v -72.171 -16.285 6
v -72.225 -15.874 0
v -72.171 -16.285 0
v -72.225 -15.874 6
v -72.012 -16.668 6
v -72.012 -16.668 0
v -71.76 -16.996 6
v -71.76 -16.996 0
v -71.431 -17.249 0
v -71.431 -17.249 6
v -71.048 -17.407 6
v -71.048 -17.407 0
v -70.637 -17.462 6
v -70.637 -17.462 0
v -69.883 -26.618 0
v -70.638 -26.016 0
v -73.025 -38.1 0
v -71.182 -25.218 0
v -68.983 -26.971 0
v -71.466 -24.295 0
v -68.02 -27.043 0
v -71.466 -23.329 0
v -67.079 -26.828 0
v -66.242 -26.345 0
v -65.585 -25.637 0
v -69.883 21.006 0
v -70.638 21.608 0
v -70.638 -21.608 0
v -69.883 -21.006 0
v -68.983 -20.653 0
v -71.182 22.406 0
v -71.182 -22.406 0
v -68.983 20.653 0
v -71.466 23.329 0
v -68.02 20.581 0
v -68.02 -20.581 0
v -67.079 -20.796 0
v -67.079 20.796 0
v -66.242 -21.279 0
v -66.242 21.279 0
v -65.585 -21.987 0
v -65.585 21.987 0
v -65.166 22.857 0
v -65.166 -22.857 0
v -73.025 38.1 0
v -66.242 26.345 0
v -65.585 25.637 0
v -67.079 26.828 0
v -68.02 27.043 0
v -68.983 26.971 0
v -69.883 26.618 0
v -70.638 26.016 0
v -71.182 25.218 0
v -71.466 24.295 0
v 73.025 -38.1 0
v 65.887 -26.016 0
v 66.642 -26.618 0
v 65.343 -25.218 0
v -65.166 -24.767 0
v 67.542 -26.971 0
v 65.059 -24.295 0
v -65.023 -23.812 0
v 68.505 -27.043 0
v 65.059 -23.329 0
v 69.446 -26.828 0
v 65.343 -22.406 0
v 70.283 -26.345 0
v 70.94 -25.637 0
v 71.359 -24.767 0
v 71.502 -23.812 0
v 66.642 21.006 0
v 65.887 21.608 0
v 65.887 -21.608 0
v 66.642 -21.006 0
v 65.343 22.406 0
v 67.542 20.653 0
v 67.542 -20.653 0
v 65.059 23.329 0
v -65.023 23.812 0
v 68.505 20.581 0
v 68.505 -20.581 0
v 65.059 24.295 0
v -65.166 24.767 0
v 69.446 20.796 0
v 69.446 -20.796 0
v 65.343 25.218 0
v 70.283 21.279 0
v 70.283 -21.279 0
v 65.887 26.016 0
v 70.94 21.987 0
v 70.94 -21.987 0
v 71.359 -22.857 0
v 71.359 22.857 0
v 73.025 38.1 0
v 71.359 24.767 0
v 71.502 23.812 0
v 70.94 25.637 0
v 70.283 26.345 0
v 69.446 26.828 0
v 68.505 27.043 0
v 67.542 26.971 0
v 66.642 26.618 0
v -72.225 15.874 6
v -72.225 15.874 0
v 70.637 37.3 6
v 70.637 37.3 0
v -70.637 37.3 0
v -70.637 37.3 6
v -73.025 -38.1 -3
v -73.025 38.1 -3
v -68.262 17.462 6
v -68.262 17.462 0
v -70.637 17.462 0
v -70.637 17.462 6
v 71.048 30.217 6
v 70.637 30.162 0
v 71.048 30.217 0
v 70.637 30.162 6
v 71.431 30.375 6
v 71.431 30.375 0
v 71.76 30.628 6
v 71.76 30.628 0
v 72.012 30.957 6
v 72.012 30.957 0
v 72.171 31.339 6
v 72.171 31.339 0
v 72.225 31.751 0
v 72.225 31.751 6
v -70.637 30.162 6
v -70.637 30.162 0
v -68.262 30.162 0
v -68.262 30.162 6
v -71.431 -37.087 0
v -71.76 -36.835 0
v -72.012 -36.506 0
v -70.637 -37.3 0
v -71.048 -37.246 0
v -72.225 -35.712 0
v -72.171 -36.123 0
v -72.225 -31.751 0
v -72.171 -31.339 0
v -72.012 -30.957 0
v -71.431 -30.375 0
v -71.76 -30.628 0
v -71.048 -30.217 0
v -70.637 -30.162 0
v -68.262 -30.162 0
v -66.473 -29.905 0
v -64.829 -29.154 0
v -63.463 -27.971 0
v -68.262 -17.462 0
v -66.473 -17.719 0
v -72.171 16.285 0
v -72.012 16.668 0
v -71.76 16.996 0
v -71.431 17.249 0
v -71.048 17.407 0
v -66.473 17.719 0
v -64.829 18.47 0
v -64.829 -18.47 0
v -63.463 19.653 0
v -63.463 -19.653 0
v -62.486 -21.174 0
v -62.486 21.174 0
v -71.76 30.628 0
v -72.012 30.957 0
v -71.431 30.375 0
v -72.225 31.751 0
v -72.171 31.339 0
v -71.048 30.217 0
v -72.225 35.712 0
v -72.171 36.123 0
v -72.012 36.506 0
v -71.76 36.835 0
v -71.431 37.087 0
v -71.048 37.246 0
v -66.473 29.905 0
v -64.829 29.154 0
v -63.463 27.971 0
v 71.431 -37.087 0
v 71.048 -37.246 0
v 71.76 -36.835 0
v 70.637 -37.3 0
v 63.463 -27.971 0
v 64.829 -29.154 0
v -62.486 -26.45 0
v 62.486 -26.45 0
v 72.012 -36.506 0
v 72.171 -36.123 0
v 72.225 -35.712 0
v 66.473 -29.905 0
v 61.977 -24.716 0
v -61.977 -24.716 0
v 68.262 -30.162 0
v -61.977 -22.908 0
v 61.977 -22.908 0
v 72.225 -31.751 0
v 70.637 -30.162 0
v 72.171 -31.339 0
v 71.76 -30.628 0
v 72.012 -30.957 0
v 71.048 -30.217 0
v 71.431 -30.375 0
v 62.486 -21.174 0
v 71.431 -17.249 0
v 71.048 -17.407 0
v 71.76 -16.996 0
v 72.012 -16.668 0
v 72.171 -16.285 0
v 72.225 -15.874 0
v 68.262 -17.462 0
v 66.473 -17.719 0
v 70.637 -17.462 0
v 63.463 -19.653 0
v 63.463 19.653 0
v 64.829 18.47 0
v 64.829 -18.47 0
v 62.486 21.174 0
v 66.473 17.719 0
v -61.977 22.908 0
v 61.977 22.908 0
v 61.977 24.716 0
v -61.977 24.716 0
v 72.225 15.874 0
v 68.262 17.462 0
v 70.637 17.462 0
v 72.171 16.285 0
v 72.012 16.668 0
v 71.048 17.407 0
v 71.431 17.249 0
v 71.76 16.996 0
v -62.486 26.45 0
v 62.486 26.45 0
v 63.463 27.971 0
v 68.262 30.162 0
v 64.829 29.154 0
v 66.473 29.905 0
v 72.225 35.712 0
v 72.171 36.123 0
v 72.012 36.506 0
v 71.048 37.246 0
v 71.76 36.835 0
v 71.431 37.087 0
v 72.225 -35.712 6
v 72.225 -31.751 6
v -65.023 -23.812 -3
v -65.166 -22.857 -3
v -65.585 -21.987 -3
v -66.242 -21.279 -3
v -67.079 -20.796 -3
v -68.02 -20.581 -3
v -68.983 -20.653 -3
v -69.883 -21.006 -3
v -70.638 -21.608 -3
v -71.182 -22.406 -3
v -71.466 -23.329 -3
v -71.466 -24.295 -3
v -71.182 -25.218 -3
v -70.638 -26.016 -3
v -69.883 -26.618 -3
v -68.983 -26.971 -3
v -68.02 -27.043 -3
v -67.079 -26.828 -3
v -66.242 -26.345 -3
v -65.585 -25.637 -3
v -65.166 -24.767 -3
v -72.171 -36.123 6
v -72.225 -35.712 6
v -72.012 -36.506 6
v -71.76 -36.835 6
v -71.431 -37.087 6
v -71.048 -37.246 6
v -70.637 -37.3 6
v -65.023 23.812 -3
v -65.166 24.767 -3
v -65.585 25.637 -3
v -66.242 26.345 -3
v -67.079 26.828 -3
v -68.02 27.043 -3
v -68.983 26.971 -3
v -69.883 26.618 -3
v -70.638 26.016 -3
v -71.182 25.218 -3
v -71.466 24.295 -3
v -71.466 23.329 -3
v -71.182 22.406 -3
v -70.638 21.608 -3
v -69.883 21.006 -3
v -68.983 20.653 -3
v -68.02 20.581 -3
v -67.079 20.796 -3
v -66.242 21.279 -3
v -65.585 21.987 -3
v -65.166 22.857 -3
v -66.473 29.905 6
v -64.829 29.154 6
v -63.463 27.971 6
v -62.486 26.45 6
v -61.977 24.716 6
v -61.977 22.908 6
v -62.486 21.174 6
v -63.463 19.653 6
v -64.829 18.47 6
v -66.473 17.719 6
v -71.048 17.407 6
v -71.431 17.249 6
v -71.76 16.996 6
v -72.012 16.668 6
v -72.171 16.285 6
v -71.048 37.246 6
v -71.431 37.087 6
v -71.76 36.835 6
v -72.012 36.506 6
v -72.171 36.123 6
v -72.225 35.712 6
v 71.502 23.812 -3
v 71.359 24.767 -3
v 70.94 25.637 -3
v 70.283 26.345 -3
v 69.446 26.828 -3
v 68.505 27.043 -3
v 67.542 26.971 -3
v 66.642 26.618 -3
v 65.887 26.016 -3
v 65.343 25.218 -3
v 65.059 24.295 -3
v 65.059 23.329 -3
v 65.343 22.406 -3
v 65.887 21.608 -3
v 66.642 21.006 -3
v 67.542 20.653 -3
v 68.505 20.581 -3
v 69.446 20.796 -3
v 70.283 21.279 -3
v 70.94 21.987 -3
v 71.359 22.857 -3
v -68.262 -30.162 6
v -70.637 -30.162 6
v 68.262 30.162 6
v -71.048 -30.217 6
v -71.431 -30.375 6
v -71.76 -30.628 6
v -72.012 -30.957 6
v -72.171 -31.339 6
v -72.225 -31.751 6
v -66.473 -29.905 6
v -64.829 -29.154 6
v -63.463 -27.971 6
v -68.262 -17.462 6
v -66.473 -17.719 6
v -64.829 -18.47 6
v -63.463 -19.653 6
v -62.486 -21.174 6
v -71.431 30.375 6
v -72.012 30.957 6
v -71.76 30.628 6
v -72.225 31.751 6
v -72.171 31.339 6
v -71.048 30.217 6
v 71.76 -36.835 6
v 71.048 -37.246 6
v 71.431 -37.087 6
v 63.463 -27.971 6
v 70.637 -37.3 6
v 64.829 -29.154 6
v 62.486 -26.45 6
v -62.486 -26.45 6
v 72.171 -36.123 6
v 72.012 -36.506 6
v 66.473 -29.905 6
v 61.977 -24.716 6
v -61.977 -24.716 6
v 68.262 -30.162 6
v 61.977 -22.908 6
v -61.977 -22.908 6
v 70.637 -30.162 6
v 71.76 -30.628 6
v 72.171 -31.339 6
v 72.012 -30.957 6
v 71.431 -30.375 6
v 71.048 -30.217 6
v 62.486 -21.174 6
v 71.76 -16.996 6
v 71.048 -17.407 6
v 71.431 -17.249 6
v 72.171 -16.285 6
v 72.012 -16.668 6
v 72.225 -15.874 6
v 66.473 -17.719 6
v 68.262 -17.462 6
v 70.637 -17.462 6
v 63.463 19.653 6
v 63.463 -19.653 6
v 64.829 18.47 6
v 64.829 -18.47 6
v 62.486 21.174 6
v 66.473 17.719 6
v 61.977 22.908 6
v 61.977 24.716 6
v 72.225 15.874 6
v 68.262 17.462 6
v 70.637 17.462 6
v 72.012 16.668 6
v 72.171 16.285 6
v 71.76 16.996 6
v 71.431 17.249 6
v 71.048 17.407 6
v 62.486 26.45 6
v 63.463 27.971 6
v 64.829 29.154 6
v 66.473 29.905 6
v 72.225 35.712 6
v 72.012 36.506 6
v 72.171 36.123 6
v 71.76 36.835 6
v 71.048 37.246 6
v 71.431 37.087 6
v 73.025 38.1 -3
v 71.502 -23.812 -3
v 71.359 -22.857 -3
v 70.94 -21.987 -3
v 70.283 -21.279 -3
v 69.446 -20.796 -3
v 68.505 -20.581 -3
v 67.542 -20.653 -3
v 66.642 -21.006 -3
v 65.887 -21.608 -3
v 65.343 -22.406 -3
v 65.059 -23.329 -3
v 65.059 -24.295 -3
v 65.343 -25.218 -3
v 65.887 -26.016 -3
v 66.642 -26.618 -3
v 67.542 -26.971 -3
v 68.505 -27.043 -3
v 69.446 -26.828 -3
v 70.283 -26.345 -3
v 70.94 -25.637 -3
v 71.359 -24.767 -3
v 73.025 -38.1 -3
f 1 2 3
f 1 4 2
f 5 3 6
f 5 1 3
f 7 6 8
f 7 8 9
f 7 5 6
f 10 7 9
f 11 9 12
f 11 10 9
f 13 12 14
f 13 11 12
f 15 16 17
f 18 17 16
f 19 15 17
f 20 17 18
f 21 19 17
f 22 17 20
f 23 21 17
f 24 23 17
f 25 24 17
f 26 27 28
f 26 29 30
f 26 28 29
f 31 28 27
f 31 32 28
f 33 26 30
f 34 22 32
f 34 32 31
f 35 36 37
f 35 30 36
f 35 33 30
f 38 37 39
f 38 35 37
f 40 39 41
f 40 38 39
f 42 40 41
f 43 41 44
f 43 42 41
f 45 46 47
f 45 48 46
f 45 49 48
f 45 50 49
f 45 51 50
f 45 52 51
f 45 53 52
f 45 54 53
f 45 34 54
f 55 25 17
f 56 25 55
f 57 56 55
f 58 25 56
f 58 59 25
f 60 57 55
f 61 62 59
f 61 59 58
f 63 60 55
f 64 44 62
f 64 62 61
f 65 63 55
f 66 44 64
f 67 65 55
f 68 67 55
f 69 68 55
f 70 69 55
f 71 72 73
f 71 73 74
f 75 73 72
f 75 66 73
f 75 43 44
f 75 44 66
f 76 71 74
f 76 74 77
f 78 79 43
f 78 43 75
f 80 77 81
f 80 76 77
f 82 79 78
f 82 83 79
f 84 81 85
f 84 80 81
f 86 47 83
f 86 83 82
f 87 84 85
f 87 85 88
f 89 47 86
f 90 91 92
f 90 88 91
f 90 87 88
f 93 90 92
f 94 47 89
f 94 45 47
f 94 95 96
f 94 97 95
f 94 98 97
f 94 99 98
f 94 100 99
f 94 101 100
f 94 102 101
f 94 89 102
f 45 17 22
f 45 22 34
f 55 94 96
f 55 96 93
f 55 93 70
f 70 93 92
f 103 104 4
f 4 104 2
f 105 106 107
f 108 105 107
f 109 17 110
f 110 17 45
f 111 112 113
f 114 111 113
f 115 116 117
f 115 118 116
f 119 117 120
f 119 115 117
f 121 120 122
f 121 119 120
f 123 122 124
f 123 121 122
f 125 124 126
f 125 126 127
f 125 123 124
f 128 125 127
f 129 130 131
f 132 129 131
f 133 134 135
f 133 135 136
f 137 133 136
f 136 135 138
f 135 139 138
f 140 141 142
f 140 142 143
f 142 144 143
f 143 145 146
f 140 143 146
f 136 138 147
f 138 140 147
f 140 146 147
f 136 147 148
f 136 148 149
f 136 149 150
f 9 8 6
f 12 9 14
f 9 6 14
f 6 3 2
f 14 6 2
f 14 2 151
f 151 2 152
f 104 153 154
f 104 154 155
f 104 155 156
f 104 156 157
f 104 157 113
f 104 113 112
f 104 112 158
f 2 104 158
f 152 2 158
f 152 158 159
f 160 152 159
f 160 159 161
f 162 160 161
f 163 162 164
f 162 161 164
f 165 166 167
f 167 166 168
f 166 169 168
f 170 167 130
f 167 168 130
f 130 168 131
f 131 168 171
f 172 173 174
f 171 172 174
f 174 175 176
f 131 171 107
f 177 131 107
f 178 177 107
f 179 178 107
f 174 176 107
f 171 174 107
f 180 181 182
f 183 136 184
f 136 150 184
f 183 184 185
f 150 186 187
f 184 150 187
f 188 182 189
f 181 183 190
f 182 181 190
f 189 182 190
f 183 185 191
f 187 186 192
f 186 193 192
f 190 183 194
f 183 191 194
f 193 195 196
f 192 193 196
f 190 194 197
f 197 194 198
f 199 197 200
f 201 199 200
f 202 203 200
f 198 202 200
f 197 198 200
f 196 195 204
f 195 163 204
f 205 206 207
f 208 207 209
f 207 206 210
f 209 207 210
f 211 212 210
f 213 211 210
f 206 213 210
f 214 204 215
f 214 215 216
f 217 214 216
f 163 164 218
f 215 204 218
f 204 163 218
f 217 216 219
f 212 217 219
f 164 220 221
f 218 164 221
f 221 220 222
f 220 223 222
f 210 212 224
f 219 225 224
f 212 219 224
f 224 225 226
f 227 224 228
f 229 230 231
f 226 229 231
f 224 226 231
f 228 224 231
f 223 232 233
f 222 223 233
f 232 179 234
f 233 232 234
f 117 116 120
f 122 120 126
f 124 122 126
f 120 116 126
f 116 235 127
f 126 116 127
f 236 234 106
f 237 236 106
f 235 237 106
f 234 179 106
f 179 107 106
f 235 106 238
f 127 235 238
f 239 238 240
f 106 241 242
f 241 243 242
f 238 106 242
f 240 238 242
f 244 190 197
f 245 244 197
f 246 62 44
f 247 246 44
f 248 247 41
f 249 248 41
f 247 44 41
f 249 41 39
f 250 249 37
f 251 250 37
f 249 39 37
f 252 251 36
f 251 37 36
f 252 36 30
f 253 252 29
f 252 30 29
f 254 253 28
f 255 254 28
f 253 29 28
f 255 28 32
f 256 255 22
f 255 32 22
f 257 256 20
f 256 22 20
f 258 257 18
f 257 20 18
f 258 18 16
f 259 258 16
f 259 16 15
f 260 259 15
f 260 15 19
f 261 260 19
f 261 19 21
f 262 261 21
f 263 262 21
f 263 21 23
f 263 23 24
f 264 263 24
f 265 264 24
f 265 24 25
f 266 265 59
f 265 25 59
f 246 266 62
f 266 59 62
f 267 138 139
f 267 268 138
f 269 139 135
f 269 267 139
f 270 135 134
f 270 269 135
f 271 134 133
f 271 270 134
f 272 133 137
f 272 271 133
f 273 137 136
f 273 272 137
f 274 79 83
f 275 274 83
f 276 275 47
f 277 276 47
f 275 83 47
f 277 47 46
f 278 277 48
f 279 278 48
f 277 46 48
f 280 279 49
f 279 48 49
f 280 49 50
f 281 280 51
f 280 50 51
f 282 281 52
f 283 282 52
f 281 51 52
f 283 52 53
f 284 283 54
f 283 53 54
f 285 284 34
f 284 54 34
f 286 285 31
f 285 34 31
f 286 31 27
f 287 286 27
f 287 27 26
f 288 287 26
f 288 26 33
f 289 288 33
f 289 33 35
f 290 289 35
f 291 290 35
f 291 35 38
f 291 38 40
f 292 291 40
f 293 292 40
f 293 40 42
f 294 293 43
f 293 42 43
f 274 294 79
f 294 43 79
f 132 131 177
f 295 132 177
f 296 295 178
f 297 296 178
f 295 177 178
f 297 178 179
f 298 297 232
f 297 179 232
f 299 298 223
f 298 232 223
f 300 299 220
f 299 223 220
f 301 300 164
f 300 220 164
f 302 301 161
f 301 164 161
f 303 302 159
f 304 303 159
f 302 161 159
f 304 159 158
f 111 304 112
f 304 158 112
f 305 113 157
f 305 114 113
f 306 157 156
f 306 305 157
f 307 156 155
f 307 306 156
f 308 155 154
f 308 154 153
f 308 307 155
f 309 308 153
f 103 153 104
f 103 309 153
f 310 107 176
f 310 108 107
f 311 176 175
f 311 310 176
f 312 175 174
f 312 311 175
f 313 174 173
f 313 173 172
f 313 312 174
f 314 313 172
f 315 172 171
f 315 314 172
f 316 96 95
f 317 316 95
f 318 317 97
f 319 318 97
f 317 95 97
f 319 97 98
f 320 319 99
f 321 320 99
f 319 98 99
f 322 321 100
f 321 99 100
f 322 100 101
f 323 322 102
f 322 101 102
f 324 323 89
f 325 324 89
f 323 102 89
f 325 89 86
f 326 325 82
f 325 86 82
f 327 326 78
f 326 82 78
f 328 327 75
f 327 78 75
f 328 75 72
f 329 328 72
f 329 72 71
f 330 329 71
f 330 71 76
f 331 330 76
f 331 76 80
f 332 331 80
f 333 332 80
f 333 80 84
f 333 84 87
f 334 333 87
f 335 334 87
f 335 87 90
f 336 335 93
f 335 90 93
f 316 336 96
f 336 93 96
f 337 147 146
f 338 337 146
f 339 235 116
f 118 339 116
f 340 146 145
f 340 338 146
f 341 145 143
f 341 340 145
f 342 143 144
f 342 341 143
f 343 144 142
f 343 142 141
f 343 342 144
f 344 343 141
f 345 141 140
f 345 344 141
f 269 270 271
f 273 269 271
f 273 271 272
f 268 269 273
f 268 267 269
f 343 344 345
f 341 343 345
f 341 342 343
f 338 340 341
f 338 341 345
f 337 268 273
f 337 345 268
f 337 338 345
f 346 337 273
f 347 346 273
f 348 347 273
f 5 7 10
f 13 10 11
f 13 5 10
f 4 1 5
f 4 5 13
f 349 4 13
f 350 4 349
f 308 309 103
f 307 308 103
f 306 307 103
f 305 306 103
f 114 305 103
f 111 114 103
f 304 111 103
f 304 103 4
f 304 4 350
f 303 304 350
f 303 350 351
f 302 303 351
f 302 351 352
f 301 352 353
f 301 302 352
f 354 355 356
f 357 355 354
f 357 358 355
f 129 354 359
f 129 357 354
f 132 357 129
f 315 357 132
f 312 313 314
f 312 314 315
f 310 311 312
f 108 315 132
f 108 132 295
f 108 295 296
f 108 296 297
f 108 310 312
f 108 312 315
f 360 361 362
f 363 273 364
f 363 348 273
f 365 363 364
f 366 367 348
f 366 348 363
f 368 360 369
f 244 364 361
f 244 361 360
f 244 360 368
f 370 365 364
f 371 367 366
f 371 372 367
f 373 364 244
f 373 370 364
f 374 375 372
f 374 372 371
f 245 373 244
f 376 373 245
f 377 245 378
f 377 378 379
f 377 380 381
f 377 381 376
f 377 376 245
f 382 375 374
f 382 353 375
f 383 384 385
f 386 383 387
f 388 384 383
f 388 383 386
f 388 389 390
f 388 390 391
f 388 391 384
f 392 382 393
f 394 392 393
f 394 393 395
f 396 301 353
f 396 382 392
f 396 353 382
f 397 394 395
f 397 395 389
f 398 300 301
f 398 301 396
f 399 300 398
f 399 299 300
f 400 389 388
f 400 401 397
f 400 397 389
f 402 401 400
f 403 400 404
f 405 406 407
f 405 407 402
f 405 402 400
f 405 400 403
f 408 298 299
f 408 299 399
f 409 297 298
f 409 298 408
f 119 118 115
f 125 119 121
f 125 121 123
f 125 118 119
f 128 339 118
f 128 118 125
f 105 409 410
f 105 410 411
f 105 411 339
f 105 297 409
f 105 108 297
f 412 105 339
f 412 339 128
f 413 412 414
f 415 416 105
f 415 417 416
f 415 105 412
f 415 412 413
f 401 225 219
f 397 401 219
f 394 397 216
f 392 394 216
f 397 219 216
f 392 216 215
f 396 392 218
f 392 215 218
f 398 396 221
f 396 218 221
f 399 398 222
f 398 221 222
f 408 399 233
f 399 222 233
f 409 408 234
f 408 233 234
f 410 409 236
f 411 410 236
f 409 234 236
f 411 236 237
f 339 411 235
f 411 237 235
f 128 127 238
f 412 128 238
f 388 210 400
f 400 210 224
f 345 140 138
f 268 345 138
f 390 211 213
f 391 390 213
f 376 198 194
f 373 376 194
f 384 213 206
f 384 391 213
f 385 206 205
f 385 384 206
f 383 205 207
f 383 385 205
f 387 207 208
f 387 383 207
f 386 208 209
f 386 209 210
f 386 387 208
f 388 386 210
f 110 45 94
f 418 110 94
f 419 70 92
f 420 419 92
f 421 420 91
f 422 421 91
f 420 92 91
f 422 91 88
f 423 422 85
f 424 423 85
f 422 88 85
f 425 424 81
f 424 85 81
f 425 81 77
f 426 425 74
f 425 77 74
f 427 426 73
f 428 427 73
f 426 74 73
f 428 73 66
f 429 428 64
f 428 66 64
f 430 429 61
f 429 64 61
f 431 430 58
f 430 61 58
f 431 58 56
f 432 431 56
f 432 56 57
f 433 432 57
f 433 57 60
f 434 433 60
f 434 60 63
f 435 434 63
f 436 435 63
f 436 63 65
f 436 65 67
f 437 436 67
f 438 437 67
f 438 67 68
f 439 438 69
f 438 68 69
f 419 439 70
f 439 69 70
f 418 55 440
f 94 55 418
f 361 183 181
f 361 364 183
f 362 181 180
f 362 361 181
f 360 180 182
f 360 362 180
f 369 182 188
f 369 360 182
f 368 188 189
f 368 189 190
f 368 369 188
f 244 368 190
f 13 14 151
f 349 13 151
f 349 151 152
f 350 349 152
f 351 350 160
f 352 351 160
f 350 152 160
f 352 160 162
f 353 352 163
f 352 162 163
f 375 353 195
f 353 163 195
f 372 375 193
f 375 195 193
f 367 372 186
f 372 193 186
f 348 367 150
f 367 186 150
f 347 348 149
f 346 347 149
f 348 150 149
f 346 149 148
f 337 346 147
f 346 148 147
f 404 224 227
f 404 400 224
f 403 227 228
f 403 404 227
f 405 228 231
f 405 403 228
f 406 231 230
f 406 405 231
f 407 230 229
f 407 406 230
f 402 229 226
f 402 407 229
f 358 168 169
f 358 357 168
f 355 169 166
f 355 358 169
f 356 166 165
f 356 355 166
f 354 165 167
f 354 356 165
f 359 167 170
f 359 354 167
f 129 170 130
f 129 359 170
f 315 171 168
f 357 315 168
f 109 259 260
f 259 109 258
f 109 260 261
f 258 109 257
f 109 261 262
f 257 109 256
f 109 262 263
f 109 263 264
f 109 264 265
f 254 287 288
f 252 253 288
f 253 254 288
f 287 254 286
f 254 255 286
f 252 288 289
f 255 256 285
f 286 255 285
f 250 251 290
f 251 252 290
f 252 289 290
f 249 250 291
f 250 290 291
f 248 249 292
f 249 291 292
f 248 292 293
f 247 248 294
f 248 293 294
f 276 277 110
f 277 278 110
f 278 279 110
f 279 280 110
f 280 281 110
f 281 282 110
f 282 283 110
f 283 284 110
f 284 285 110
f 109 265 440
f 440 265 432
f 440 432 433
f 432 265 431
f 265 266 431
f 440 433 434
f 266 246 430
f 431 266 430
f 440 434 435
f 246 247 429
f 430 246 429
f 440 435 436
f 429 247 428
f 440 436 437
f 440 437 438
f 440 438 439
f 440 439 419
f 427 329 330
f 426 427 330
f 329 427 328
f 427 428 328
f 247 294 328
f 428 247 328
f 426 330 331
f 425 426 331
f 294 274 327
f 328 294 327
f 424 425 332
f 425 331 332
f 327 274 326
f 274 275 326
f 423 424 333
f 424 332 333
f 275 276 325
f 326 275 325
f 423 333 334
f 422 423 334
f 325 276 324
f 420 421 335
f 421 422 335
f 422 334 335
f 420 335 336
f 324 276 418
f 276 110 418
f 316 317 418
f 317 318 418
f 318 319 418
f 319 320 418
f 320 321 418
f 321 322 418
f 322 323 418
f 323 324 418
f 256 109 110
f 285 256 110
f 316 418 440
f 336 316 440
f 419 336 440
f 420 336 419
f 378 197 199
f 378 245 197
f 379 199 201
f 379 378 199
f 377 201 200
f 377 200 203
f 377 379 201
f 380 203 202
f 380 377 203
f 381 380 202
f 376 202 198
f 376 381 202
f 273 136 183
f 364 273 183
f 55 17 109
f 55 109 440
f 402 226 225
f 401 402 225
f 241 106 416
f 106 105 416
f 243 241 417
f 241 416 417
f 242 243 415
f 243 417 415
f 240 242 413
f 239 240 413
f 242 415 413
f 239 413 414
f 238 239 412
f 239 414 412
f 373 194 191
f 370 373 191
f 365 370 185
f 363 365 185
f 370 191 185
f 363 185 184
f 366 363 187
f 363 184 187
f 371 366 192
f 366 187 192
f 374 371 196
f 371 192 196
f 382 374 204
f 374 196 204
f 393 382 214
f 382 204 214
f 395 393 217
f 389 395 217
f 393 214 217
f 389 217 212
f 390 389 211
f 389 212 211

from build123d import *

# Parameters (mm, degrees)
F0_W     = 146.05
F0_H     = 76.2
F0_R     = 3.24
F1_DEPTH = 3
F2_DEPTH = 6
F3_R     = 1.588


with BuildPart() as f1:
    # F0 (on Top) → F1 (new body)
    with BuildSketch(Plane.XY):
        Rectangle(F0_W, F0_H)
        with Locations((-68.2625, -23.812)):
            Circle(F0_R, mode=Mode.SUBTRACT)
        with Locations((68.2625, -23.812)):
            Circle(F0_R, mode=Mode.SUBTRACT)
        with Locations((-68.2625, 23.812)):
            Circle(F0_R, mode=Mode.SUBTRACT)
        with BuildLine():
            Line((-72.225, 30.1625), (-72.225, 37.3))
            Line((-72.225, 37.3), (72.225, 37.3))
            Line((72.225, 37.3), (72.225, 30.1625))
            Line((72.225, 30.1625), (68.2625, 30.1625))
            ThreePointArc((68.2625, 30.1625), (61.912, 23.812), (68.2625, 17.4615))
            Line((68.2625, 17.4615), (72.225, 17.4615))
            Line((72.225, 17.4615), (72.225, -17.4615))
            Line((72.225, -17.4615), (68.2625, -17.4615))
            ThreePointArc((68.2625, -17.4615), (61.912, -23.812), (68.2625, -30.1625))
            Line((68.2625, -30.1625), (72.225, -30.1625))
            Line((72.225, -30.1625), (72.225, -37.3))
            Line((72.225, -37.3), (-72.225, -37.3))
            Line((-72.225, -37.3), (-72.225, -30.1625))
            Line((-72.225, -30.1625), (-68.2625, -30.1625))
            ThreePointArc((-68.2625, -30.1625), (-61.912, -23.812), (-68.2625, -17.4615))
            Line((-68.2625, -17.4615), (-72.225, -17.4615))
            Line((-72.225, -17.4615), (-72.225, 17.4615))
            Line((-72.225, 17.4615), (-68.2625, 17.4615))
            ThreePointArc((-68.2625, 17.4615), (-61.912, 23.812), (-68.2625, 30.1625))
            Line((-68.2625, 30.1625), (-72.225, 30.1625))
        make_face(mode=Mode.SUBTRACT)
        with Locations((68.2625, 23.812)):
            Circle(F0_R, mode=Mode.SUBTRACT)
        with BuildLine():
            Line((72.225, 37.3), (-72.225, 37.3))
            Line((-72.225, 37.3), (-72.225, 30.1625))
            Line((-72.225, 30.1625), (-68.2625, 30.1625))
            ThreePointArc((-68.2625, 30.1625), (-61.912, 23.812), (-68.2625, 17.4615))
            Line((-68.2625, 17.4615), (-72.225, 17.4615))
            Line((-72.225, 17.4615), (-72.225, -17.4615))
            Line((-72.225, -17.4615), (-68.2625, -17.4615))
            ThreePointArc((-68.2625, -17.4615), (-61.912, -23.812), (-68.2625, -30.1625))
            Line((-68.2625, -30.1625), (-72.225, -30.1625))
            Line((-72.225, -30.1625), (-72.225, -37.3))
            Line((-72.225, -37.3), (72.225, -37.3))
            Line((72.225, -37.3), (72.225, -30.1625))
            Line((72.225, -30.1625), (68.2625, -30.1625))
            ThreePointArc((68.2625, -30.1625), (61.912, -23.812), (68.2625, -17.4615))
            Line((68.2625, -17.4615), (72.225, -17.4615))
            Line((72.225, -17.4615), (72.225, 17.4615))
            Line((72.225, 17.4615), (68.2625, 17.4615))
            ThreePointArc((68.2625, 17.4615), (61.912, 23.812), (68.2625, 30.1625))
            Line((68.2625, 30.1625), (72.225, 30.1625))
            Line((72.225, 30.1625), (72.225, 37.3))
        make_face()
    extrude(amount=-F1_DEPTH)


with BuildPart() as f2:
    # F0 (on Top) → F2 (new body)
    with BuildSketch(Plane.XY):
        with BuildLine():
            Line((72.225, 37.3), (-72.225, 37.3))
            Line((-72.225, 37.3), (-72.225, 30.1625))
            Line((-72.225, 30.1625), (-68.2625, 30.1625))
            ThreePointArc((-68.2625, 30.1625), (-61.912, 23.812), (-68.2625, 17.4615))
            Line((-68.2625, 17.4615), (-72.225, 17.4615))
            Line((-72.225, 17.4615), (-72.225, -17.4615))
            Line((-72.225, -17.4615), (-68.2625, -17.4615))
            ThreePointArc((-68.2625, -17.4615), (-61.912, -23.812), (-68.2625, -30.1625))
            Line((-68.2625, -30.1625), (-72.225, -30.1625))
            Line((-72.225, -30.1625), (-72.225, -37.3))
            Line((-72.225, -37.3), (72.225, -37.3))
            Line((72.225, -37.3), (72.225, -30.1625))
            Line((72.225, -30.1625), (68.2625, -30.1625))
            ThreePointArc((68.2625, -30.1625), (61.912, -23.812), (68.2625, -17.4615))
            Line((68.2625, -17.4615), (72.225, -17.4615))
            Line((72.225, -17.4615), (72.225, 17.4615))
            Line((72.225, 17.4615), (68.2625, 17.4615))
            ThreePointArc((68.2625, 17.4615), (61.912, 23.812), (68.2625, 30.1625))
            Line((68.2625, 30.1625), (72.225, 30.1625))
            Line((72.225, 30.1625), (72.225, 37.3))
        make_face()
    extrude(amount=F2_DEPTH)

    # F3
    f3_edges = [f2.edges().sort_by_distance(p)[0] for p in [
        (-72.225, 37.3, 3),
        (-72.225, 30.1625, 3),
        (-72.225, 17.4615, 3),
        (-72.225, -17.4615, 3),
        (-72.225, -30.1625, 3),
        (-72.225, -37.3, 3),
        (72.225, 37.3, 3),
        (72.225, 30.1625, 3),
        (72.225, 17.4615, 3),
        (72.225, -17.4615, 3),
        (72.225, -30.1625, 3),
        (72.225, -37.3, 3),
    ]]
    fillet(f3_edges, radius=F3_R)


solid = Compound([f1.part, f2.part])
